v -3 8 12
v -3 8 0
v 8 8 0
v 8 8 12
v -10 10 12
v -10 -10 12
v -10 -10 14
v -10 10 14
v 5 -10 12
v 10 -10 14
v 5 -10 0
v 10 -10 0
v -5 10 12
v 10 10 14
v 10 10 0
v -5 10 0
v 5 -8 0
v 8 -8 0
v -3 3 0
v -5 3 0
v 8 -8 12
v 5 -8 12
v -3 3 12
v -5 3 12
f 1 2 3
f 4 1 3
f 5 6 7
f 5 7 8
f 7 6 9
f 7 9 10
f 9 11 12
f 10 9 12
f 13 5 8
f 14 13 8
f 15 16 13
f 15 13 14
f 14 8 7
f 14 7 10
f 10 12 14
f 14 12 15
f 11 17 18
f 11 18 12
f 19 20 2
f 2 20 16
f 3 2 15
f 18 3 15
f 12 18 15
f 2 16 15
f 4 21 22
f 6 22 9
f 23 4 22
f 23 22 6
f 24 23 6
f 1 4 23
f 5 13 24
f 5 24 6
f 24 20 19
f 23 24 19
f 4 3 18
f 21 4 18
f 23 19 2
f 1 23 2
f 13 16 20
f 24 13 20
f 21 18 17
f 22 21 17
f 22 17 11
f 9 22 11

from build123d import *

# Parameters (mm, degrees)
SKETCH1_W           = 20
SKETCH1_H           = 20
BOSS_EXTRUDE1_DEPTH = 14
CUT_EXTRUDE1_DEPTH  = 12


with BuildPart() as part:
    # Sketch1 → Boss-Extrude1 (new body)
    with BuildSketch(Plane.XY):
        Rectangle(SKETCH1_W, SKETCH1_H)
    extrude(amount=BOSS_EXTRUDE1_DEPTH)

    # Sketch2 → Cut-Extrude1 (cut)
    with BuildSketch(Plane(origin=(0, 0, 0), x_dir=(-1, 0, 0), z_dir=(0, 0, -1))):
        Polygon((3, 8), (-8, 8), (-8, -8), (-5, -8), (-5, -10), (10, -10), (10, 10), (5, 10), (5, 3), (3, 3), align=None)
    extrude(amount=-CUT_EXTRUDE1_DEPTH, mode=Mode.SUBTRACT)


solid = part.part
